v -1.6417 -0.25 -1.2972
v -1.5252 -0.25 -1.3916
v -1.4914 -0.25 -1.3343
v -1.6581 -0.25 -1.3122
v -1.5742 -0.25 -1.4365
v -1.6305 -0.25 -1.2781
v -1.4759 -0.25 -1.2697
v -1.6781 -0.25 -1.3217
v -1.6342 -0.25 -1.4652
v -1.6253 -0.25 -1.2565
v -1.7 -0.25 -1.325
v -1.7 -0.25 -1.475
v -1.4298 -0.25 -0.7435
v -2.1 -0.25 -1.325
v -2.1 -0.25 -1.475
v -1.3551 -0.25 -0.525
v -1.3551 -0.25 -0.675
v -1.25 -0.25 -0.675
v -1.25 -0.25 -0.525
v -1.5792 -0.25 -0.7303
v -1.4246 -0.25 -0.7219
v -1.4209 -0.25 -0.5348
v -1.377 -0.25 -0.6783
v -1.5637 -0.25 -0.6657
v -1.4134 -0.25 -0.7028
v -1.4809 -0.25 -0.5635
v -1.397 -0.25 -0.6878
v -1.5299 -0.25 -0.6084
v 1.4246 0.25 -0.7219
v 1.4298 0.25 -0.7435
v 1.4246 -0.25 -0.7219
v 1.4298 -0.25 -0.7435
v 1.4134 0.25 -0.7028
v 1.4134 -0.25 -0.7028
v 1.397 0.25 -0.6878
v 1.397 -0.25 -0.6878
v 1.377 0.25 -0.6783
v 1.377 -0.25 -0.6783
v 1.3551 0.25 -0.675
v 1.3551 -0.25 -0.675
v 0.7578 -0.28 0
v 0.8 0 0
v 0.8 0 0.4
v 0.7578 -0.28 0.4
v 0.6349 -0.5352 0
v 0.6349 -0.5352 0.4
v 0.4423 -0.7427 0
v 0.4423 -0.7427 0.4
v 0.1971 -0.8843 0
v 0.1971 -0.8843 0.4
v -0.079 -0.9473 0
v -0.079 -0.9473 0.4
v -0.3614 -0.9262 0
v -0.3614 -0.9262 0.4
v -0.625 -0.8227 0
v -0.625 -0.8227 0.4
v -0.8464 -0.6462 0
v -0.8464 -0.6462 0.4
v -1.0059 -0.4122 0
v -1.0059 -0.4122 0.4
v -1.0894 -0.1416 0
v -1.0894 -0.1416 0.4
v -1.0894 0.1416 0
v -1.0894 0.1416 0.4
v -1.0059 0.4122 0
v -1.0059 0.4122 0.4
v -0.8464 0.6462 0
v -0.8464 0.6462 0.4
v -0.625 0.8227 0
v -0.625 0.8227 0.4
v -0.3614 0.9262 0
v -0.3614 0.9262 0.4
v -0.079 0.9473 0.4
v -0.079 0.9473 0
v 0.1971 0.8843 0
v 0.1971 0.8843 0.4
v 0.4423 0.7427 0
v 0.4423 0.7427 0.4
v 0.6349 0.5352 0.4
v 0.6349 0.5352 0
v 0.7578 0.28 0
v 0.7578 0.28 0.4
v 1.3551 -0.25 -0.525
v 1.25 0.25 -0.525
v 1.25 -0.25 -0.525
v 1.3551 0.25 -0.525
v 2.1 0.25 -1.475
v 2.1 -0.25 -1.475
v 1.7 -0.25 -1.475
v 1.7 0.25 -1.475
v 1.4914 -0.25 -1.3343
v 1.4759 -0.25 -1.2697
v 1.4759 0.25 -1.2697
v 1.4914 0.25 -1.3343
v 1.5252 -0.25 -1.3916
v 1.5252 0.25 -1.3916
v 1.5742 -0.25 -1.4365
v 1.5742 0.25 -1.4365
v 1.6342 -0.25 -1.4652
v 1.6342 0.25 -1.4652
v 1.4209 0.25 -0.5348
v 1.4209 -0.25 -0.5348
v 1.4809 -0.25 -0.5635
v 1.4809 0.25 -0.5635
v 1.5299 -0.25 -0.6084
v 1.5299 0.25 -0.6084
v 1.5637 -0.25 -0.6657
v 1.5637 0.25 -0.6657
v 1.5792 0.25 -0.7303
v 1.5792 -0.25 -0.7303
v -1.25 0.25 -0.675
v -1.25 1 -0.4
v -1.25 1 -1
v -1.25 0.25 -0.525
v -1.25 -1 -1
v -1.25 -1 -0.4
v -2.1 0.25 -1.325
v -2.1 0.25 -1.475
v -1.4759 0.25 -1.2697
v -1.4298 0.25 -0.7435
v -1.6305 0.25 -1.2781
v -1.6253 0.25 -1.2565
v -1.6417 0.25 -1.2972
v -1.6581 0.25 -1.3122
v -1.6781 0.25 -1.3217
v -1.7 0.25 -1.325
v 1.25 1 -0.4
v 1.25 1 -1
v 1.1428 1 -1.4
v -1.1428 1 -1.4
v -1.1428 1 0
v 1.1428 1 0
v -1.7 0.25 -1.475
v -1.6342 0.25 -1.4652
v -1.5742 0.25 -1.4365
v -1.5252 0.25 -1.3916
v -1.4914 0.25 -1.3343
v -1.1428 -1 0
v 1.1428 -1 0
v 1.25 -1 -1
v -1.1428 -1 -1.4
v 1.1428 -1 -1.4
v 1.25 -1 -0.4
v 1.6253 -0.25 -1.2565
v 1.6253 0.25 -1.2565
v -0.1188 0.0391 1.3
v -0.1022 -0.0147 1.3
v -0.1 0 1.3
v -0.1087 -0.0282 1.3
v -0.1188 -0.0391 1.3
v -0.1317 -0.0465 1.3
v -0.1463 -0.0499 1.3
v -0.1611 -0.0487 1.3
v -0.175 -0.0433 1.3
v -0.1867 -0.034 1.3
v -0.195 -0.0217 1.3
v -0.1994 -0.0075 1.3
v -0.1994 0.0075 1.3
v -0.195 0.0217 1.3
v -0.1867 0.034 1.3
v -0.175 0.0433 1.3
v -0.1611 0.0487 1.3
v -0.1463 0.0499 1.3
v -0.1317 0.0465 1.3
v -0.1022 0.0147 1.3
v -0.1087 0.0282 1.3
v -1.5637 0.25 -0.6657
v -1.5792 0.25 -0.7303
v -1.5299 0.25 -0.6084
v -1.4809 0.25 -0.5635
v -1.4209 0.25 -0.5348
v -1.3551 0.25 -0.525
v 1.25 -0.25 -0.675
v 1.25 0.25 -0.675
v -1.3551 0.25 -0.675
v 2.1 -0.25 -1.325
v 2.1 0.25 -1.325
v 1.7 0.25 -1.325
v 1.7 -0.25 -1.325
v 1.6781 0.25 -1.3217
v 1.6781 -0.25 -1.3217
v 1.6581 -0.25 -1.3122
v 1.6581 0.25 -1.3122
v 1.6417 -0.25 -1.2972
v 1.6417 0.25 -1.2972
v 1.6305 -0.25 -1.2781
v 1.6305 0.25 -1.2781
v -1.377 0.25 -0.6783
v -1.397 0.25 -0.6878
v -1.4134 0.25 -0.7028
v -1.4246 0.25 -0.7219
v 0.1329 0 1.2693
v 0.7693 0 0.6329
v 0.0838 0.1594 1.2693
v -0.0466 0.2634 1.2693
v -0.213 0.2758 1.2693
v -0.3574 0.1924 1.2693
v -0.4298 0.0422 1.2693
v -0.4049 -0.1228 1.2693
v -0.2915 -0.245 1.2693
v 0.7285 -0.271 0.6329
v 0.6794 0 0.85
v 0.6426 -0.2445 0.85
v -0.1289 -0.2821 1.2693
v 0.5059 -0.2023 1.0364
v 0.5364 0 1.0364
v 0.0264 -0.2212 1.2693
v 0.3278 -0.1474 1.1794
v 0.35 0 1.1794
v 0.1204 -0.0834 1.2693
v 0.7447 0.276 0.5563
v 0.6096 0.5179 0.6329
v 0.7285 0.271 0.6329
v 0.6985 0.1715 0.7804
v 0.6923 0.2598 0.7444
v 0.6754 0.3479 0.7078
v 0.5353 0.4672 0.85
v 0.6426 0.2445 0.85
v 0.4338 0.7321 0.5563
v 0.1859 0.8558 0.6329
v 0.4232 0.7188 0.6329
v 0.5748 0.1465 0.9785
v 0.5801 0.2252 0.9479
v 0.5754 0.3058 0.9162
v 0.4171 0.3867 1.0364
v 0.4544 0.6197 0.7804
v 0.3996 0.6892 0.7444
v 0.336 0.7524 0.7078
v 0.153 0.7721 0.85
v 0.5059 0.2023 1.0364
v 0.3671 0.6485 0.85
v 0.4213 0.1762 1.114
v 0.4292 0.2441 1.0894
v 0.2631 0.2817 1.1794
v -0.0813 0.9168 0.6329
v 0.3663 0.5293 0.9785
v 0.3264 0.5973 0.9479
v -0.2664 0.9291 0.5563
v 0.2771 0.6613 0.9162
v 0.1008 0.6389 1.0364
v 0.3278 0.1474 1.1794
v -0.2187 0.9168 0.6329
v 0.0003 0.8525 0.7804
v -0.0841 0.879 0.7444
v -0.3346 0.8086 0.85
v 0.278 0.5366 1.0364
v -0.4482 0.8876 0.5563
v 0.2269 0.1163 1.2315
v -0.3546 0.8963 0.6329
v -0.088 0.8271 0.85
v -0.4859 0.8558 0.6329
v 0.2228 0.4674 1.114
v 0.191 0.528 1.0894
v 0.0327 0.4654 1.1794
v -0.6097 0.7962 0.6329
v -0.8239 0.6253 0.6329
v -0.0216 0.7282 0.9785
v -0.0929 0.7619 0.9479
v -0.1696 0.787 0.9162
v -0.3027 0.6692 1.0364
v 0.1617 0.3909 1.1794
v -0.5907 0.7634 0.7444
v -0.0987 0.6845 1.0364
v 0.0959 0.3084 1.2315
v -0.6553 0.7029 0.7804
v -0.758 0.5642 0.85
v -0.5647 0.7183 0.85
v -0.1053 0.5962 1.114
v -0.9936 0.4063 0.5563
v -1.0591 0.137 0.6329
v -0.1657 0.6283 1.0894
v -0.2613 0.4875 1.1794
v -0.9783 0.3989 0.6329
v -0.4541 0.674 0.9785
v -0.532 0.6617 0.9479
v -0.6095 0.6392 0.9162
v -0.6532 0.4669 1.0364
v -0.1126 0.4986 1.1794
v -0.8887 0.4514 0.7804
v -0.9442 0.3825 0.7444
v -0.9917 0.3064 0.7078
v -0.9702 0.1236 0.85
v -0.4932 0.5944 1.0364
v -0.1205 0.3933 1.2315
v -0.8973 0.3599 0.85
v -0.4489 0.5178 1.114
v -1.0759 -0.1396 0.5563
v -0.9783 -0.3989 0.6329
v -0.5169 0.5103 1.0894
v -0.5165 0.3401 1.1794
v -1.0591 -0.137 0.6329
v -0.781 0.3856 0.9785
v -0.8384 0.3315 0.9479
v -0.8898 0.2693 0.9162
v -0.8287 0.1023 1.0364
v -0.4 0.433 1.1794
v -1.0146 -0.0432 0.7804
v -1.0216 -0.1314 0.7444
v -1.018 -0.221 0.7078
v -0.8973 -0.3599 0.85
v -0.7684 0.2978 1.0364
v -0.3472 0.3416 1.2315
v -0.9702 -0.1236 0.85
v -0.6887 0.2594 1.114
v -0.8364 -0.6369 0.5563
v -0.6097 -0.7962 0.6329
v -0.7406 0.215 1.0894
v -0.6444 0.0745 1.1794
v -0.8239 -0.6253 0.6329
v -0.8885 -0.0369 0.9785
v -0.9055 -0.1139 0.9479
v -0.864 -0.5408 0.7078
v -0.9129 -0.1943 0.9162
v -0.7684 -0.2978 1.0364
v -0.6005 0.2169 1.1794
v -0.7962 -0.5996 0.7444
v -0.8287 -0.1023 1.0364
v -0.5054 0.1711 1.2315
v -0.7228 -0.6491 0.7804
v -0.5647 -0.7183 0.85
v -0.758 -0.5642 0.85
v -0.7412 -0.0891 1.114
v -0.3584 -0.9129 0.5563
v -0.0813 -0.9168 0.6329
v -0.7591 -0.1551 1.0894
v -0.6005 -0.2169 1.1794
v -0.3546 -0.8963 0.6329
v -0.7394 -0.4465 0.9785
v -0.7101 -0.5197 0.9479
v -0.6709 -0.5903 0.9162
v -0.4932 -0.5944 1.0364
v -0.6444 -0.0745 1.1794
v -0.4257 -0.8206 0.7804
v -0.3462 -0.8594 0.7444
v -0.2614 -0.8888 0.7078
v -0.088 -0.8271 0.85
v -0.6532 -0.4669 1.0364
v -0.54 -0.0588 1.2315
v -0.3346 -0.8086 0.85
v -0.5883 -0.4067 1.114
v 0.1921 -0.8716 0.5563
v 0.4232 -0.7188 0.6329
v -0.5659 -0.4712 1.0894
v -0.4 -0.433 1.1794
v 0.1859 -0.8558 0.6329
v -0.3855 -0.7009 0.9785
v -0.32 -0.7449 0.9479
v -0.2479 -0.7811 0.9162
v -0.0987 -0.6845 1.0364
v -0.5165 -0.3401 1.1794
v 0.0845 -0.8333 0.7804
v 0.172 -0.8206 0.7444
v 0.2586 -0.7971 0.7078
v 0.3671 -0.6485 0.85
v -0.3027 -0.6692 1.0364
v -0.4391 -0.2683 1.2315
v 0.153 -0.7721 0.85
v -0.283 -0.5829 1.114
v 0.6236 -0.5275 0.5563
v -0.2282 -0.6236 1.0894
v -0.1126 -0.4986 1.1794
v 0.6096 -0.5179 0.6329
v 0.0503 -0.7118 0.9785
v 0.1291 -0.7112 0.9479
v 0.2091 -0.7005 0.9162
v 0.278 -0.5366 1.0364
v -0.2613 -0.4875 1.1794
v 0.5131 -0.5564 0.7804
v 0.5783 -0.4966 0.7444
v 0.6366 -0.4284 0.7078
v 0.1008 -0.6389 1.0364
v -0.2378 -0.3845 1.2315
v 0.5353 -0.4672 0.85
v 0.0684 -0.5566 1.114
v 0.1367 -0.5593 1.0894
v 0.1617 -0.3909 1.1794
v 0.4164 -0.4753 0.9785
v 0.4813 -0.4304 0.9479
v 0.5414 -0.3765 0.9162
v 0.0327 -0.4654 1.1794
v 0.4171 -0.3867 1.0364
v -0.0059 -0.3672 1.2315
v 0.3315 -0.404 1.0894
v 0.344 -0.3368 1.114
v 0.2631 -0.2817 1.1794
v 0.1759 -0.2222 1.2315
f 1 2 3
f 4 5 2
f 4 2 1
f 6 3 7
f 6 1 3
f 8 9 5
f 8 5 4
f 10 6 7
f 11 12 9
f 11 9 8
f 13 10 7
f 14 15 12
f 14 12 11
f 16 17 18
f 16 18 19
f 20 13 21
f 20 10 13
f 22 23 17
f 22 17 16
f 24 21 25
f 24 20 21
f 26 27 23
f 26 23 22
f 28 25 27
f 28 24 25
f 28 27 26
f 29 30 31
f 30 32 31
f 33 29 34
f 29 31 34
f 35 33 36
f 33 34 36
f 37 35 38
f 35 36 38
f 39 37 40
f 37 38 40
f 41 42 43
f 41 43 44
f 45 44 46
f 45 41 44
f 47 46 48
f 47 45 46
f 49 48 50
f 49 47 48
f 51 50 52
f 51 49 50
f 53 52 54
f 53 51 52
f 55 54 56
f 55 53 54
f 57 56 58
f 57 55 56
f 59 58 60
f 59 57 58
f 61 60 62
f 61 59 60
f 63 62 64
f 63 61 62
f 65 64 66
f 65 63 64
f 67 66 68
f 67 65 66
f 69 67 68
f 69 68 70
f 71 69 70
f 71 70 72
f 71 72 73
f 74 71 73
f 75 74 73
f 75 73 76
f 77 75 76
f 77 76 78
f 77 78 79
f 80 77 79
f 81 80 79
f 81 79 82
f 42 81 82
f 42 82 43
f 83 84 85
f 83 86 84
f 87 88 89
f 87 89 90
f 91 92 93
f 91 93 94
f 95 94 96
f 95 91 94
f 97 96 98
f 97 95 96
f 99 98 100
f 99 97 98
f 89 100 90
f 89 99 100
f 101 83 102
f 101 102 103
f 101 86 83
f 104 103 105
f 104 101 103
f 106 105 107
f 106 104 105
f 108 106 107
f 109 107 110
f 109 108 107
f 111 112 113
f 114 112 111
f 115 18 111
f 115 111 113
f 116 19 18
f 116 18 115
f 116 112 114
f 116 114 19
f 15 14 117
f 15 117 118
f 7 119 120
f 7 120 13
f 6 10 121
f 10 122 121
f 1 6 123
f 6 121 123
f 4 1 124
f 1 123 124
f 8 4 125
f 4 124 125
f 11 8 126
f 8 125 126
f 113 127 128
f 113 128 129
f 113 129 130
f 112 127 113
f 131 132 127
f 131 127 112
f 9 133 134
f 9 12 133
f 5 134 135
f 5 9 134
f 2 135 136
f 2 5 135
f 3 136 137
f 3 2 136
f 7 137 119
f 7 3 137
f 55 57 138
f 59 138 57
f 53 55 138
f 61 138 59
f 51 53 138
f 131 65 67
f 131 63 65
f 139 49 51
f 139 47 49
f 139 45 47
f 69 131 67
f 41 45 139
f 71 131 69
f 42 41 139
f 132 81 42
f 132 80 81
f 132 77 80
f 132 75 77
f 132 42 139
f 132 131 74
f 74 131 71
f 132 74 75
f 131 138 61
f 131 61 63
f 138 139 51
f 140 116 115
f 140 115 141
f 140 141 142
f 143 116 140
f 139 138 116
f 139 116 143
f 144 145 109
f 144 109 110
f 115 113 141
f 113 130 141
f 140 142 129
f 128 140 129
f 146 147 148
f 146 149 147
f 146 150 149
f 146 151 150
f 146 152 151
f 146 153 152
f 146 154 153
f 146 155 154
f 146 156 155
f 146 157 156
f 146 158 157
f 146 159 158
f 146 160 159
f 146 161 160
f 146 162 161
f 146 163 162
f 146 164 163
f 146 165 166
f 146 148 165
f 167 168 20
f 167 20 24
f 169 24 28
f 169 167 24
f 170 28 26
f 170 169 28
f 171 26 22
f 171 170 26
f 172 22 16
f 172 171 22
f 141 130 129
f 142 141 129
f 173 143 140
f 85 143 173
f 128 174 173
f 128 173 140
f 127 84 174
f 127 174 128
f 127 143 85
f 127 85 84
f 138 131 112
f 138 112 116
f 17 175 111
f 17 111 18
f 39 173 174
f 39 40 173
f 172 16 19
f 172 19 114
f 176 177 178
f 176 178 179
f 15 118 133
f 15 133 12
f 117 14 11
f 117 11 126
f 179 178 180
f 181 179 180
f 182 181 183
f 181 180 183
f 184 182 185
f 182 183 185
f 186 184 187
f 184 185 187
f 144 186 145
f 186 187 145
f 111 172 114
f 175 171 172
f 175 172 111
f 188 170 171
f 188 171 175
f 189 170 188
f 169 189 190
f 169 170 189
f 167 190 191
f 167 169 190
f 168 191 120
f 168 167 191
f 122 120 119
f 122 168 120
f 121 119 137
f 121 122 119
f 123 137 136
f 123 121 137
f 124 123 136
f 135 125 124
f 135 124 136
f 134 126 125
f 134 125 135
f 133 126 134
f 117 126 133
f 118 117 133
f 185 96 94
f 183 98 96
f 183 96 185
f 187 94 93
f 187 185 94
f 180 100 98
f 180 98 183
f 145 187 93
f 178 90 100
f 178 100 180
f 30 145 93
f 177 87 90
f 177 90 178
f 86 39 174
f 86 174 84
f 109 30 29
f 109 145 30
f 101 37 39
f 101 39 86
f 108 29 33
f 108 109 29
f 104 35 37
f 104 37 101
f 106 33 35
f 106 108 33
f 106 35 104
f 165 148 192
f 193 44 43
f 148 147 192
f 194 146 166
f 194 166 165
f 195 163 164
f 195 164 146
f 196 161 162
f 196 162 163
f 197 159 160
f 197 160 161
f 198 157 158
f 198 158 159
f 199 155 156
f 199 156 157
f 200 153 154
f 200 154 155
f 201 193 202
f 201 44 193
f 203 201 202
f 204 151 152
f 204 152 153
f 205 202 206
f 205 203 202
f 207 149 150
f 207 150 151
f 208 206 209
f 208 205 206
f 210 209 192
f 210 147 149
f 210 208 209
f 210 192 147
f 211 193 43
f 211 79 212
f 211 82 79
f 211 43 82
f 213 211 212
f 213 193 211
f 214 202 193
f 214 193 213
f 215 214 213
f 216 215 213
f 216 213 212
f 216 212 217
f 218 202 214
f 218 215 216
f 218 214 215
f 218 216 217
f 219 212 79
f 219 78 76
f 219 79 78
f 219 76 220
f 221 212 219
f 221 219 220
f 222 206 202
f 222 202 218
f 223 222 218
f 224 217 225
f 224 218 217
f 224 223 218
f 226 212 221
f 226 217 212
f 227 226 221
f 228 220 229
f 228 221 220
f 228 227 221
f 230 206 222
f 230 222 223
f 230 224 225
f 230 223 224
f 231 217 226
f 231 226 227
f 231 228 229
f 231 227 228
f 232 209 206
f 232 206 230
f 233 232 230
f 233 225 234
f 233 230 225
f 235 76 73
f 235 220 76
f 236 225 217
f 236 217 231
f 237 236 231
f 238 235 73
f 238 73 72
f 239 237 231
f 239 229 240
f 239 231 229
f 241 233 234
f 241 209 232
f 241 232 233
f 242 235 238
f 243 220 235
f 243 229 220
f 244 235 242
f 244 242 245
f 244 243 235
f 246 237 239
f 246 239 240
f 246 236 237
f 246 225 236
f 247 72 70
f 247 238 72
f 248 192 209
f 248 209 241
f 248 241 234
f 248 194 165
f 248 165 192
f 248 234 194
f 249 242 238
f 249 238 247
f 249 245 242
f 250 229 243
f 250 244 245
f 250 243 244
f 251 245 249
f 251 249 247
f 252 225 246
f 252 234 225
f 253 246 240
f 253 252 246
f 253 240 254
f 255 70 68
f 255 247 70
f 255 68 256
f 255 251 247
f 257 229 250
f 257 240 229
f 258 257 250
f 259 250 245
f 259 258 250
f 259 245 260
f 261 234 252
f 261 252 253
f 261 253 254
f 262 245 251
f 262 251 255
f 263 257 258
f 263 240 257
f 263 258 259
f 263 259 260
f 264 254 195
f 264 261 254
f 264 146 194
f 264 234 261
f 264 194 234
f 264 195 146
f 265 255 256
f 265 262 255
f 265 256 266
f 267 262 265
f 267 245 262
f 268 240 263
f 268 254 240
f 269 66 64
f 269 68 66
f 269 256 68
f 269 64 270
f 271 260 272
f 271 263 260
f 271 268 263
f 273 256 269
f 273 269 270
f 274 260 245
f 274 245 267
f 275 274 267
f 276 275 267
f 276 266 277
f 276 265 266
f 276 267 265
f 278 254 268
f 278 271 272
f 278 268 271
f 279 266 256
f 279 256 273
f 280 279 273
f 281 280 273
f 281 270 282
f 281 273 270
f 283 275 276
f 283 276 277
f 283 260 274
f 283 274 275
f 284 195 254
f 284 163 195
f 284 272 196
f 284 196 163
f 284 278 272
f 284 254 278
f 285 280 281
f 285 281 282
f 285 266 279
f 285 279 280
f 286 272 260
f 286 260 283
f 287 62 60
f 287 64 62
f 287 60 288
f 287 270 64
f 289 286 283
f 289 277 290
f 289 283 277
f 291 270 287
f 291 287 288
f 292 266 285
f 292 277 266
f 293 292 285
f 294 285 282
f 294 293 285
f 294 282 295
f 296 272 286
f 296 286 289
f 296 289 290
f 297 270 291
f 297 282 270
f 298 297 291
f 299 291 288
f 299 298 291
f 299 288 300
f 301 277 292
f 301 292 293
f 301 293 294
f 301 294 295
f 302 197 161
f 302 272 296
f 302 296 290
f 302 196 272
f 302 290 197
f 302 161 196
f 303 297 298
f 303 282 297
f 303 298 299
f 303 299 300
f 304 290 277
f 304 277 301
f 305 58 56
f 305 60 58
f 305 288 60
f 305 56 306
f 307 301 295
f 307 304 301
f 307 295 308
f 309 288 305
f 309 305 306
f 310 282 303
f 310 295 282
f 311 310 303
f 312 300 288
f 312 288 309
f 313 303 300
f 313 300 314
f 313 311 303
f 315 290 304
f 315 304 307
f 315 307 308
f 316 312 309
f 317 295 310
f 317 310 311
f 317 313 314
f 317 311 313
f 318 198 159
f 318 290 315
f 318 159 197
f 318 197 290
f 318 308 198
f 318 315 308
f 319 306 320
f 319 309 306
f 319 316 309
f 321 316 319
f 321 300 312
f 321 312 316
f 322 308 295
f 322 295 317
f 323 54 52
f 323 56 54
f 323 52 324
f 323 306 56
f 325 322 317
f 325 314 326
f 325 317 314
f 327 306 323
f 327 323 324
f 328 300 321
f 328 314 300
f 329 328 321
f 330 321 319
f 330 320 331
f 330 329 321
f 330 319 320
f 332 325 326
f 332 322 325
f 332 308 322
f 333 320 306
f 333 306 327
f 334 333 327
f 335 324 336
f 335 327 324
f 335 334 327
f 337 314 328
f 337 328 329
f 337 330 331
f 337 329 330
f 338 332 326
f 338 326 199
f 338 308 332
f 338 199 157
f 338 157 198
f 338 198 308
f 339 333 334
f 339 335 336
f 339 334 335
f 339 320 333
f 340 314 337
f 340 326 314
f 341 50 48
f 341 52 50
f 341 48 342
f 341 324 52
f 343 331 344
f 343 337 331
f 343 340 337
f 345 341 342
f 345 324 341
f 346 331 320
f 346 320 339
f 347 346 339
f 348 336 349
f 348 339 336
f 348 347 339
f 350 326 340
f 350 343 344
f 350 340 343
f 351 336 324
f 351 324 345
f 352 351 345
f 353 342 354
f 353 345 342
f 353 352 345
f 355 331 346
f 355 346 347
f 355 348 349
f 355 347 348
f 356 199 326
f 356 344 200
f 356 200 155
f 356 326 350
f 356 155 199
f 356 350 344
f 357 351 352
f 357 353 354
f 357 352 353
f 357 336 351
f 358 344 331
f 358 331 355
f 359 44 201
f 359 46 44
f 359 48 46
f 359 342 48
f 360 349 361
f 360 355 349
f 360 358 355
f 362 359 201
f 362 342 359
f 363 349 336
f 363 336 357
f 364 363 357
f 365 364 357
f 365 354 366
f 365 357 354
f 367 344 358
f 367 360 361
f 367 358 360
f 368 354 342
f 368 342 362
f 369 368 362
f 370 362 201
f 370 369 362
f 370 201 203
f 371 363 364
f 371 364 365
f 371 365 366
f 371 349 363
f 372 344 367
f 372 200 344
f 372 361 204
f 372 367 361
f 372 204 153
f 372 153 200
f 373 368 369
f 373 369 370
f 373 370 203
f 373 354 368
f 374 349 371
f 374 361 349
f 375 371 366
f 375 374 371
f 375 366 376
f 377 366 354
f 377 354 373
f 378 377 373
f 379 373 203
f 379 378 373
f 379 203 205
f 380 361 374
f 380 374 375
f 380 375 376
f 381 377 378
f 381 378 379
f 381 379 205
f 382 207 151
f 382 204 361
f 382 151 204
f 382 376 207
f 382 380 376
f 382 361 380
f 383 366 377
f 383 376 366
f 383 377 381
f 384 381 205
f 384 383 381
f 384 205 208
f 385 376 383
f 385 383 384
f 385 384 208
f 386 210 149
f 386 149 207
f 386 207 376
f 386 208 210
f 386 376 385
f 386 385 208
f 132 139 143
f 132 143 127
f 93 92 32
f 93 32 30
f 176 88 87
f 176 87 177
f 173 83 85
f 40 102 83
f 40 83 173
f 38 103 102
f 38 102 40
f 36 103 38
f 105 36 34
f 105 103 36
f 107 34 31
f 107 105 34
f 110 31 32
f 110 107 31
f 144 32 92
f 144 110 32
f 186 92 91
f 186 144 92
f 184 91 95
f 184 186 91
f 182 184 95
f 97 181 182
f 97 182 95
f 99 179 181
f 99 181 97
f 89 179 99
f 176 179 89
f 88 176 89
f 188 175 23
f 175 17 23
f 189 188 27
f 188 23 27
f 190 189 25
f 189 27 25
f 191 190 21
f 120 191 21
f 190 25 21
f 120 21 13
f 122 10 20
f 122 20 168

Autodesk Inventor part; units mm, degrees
ref_plane "YZ Plane" through (0, 0, 0) normal (1, 0, 0) x (0, 1, 0)
ref_plane "XZ Plane" through (0, 0, 0) normal (0, 1, 0) x (-1, 0, 0)
ref_plane "XY Plane" through (0, 0, 0) normal (0, 0, 1) x (1, 0, 0)
sketch "Skizze1" plane through (0, 0, 0) normal (0, 0, 1) x (1, 0, 0)
  line L0 (-1.25, -1) -> (1.25, -1)
  line L1 (1.25, -1) -> (1.25, 1)
  line L2 (1.25, 1) -> (-1.25, 1)
  line L3 (-1.25, 1) -> (-1.25, -1)
  line L4 (-1.25, -1) -> (1.25, 1) construction
  line L5 (1.25, -1) -> (-1.25, 1) construction
  point P0 (0, 0)
  dimension "d0" = 2.5
  dimension "d1" = 2
extrude "Extrusion1" add sketch "Skizze1" against normal blind 1.4
sketch "Skizze2" plane through (0, 0, 0) normal (0, 0, 1) x (1, 0, 0)
  line L0 (-1.25, -1) -> (1.25, -1) projected
  line L1 (1.25, -1) -> (1.25, 1) projected
  line L2 (1.25, 1) -> (-1.25, 1) projected
  line L3 (-1.25, 1) -> (-1.25, -1) projected
  circle A0 centre (-0.15, 0) radius 0.95
  line L4 (-1.75, 0) -> (1.75, 0) projected
  point P0 (0, 0)
  dimension "d4" = 1.9
  dimension "d5" = 1.1
extrude "Extrusion2" add sketch "Skizze2" along normal blind 1.3 contours L4 A0 | A0 L4
fillet "Rundung1" radius 0.9 1 edges at (-1.1, 0, 1.3)
sketch "Skizze4" plane through (-1.25, -1, 0) normal (-1, 0, 0) x (0, 0, 1)
  line L0 (-0.675, 1.25) -> (-0.525, 1.25)
  line L1 (-0.525, 1.25) -> (-0.525, 0.75)
  line L2 (-0.525, 0.75) -> (-0.675, 0.75)
  line L3 (-0.675, 0.75) -> (-0.675, 1.25)
  line L4 (-0.675, 1.25) -> (-0.525, 0.75) construction
  line L5 (-0.525, 1.25) -> (-0.675, 0.75) construction
  point P0 (0, 1)
  point P1 (-0.6, 1)
  point P2 (-0.6, 1)
  point P3 (-0.6, 1)
  dimension "d14" = 0.15
  dimension "d15" = 0.5
sketch "Skizze3" plane through (0, 0, 0) normal (0, 1, 0) x (-1, 0, 0)
  line L0 (1.25, 0) -> (-1.25, 0) projected
  line L1 (1.25, 0) -> (1.25, -1.4) projected
  line L2 (-1.25, -1.4) -> (1.25, -1.4) projected
  line L3 (-1.25, 0) -> (-1.25, -1.4) projected
  line L4 (1.25, 0) -> (1.25, -1.4) projected
  line L5 (1.25, -0.6) -> (1.3551, -0.6)
  line L6 (1.7, -1.4) -> (2.1, -1.4)
  line L7 (0, -1.94) -> (0, 1.84) projected
  line L8 (2.15, -0.275) -> (1.3565, -0.275) construction
  arc A0 (1.5045, -0.7369) -> (1.3551, -0.6) centre (1.3551, -0.75) ccw
  line L9 (1.5045, -0.7369) -> (1.5506, -1.2631)
  arc A1 (1.5506, -1.2631) -> (1.7, -1.4) centre (1.7, -1.25) ccw
  point P0 (0, 0)
  dimension "d10" = 2.1
  dimension "d13" = 0.6
  dimension "d24" = 0.4
  dimension "d25" = 0.15
  dimension "d26" = 0.15
  dimension "d27" = 85
sweep "Sweeping1" add profiles "Skizze4" path "Skizze3" path curves L5 A0 L9 A1 L6
mirror "Spiegeln1" about plane through (0, 0, 0) normal (1, 0, 0) of "Sweeping1"
chamfer "Fase1" distance 0.4 angle 15 2 edges at (-1.25, 0, 0) (-1.25, 0, -1.4) measured on face at (-1.25, 0.0833, -1.1583)
chamfer "Fase2" distance 0.4 angle 15 2 edges at (1.25, 0, 0) (1.25, 0, -1.4) measured on face at (1.25, -0.0833, -1.1583)
properties part number "IR LED Gullwing"
